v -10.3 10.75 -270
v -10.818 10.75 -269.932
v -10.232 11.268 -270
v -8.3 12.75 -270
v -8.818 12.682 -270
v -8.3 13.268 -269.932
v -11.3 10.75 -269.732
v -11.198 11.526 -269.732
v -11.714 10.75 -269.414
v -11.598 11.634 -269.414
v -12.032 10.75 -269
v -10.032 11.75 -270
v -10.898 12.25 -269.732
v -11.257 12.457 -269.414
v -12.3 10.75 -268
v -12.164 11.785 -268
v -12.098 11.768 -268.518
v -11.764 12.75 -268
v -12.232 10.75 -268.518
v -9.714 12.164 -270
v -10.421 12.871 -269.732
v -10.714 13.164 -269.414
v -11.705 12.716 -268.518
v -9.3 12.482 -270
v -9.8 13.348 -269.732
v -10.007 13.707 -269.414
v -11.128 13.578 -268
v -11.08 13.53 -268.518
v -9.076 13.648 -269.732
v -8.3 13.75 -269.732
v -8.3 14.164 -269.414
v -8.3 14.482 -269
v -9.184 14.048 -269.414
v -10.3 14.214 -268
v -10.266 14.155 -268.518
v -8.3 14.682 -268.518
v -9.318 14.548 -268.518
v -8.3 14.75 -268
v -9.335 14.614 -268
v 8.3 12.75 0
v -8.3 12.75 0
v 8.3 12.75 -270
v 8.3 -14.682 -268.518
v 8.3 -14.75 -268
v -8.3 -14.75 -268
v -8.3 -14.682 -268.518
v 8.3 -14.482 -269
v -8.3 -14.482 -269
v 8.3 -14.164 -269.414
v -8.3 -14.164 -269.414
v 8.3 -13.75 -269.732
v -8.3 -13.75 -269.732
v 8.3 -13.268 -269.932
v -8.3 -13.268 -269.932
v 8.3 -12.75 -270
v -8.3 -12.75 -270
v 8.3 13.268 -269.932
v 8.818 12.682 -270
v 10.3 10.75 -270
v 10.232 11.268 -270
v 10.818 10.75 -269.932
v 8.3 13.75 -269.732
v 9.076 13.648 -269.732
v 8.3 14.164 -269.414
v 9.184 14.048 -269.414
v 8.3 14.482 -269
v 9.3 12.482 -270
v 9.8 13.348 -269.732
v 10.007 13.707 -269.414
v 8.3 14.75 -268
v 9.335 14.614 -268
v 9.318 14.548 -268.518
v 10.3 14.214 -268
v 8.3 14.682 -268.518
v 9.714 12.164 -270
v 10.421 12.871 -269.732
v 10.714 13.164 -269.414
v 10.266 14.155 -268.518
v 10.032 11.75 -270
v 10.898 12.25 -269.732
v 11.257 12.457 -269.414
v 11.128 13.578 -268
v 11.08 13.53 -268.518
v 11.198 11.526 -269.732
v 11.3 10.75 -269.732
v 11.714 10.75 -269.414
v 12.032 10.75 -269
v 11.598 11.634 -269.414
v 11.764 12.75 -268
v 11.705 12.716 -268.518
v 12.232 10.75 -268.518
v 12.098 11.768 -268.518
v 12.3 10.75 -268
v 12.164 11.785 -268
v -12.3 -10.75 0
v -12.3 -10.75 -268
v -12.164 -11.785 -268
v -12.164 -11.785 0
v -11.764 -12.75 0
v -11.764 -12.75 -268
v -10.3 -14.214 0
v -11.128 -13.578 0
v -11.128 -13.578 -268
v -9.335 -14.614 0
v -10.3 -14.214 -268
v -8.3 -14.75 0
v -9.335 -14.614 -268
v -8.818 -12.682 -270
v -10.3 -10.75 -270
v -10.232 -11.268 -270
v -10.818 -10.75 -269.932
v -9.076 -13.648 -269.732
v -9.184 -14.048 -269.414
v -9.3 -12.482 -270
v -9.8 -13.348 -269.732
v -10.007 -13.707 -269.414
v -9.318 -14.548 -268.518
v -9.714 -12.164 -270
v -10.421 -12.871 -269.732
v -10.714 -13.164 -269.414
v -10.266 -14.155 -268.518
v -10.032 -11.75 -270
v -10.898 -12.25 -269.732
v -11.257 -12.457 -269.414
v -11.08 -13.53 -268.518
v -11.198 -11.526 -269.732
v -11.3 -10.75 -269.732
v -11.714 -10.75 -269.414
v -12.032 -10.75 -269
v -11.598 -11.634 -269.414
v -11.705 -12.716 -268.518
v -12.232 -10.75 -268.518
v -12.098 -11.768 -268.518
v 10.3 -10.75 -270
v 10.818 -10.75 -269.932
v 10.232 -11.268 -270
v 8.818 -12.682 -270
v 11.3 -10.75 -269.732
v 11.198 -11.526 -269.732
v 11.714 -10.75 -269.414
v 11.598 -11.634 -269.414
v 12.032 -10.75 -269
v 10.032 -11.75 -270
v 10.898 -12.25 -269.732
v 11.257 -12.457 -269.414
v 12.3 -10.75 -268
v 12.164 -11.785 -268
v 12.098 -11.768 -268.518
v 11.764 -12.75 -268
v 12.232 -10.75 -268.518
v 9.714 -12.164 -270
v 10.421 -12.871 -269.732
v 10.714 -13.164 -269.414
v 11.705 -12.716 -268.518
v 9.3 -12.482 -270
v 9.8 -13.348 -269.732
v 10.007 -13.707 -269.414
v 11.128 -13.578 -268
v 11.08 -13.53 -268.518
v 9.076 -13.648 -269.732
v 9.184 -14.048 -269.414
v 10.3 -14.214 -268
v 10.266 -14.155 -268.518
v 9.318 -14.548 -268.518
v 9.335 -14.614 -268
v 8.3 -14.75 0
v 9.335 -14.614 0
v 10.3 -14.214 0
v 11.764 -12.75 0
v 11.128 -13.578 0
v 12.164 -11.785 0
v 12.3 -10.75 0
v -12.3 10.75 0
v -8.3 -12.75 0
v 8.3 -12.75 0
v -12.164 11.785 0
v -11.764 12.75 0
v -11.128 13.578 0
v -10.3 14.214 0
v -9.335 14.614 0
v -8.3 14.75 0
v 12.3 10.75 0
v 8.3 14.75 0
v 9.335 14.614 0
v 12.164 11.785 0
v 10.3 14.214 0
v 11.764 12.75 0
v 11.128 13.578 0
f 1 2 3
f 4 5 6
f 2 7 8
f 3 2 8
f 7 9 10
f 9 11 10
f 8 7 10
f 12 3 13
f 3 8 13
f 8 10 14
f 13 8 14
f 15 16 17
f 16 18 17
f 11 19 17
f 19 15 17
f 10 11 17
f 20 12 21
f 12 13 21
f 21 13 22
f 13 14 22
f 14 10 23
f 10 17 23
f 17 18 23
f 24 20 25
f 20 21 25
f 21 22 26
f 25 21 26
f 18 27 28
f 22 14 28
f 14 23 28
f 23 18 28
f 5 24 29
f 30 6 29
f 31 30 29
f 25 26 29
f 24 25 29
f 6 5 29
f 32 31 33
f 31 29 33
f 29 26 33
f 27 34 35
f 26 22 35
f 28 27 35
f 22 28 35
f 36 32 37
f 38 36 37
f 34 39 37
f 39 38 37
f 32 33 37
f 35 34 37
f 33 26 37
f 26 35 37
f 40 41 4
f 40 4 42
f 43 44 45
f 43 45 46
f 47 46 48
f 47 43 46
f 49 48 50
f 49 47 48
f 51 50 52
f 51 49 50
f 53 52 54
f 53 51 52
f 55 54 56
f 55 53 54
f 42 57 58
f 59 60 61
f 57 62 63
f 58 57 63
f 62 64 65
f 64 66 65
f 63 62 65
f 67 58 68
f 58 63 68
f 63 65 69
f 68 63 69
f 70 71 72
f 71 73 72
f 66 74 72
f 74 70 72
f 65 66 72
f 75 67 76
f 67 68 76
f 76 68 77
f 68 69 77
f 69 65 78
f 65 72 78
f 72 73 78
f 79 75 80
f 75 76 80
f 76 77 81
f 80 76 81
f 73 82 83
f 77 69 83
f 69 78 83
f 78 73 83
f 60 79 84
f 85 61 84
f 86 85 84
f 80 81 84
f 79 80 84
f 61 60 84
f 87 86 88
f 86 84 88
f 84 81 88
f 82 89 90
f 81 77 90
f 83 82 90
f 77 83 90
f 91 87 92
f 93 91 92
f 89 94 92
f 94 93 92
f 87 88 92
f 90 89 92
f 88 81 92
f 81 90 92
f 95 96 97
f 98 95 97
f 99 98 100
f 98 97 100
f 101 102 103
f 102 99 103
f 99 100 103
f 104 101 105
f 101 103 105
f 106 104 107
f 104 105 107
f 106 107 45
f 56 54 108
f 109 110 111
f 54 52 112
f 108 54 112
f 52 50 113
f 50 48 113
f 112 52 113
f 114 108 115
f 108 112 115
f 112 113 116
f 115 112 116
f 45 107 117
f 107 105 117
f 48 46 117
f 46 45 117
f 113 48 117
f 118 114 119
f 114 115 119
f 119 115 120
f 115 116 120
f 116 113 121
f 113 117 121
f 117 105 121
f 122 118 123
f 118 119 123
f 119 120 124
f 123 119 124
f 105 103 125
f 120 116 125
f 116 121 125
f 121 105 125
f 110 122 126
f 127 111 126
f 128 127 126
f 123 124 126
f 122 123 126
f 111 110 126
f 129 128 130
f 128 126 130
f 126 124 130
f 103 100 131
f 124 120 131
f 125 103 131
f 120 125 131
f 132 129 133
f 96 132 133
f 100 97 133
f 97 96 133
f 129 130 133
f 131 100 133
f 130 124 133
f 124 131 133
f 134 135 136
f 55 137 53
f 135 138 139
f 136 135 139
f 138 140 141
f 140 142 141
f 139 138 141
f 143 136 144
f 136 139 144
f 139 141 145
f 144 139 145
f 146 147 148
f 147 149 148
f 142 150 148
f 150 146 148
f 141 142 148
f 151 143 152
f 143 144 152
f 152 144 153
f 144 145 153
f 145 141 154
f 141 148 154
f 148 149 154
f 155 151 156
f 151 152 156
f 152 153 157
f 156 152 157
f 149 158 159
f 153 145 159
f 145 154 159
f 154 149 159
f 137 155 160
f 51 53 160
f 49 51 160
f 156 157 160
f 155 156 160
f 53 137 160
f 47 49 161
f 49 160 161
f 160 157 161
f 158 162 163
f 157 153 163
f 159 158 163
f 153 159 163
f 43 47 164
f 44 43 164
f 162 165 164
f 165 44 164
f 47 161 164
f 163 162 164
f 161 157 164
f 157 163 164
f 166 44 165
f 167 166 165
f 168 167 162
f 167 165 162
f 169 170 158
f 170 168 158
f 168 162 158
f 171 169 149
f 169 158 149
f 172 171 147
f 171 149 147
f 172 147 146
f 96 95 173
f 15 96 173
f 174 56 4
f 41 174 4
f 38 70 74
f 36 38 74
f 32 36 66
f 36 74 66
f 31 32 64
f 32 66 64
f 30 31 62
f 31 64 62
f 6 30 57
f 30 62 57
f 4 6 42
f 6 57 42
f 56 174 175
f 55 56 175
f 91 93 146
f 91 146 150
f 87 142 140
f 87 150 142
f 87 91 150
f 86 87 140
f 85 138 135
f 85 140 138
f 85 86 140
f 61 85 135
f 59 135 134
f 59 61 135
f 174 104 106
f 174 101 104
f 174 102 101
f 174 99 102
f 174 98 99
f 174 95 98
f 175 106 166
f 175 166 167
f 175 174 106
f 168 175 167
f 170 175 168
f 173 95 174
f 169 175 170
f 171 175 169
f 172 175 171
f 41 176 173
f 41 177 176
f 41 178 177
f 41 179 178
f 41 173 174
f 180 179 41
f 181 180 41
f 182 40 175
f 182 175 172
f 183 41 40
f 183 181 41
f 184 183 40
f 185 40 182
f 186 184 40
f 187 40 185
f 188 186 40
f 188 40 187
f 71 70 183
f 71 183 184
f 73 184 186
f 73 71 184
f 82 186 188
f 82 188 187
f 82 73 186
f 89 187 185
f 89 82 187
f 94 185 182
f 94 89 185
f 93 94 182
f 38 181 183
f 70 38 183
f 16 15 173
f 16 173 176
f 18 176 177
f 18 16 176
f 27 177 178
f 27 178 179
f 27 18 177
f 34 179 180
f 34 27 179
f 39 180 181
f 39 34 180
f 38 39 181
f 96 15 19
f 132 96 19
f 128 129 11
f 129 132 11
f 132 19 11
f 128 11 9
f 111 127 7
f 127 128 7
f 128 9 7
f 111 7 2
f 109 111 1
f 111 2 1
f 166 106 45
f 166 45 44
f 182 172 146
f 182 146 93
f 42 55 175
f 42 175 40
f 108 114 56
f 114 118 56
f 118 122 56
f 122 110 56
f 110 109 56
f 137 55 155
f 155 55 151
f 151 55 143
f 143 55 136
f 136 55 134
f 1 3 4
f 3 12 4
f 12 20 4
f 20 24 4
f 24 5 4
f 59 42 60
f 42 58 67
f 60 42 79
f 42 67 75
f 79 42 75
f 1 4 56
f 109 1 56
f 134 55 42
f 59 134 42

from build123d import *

# Parameters (mm, degrees)
F0_W         = 24.6
F0_H         = 29.5
F0_W_2       = 16.6
F0_H_2       = 25.5
F1_DEPTH     = 270
F2_R         = 1.99999
F3_T1_DEPTH  = 280
F3_T4_ANGLE  = 90
F3_T6_ANGLE  = 90
F3_T8_ANGLE  = 90
F3_T10_ANGLE = 90


# Not quite as in the source:
# - a fillet or chamfer that OpenCascade refuses, or shapes differently, is made with other operations: its cross-section is extruded or revolved along the edge and cut away or added
# - a fillet or chamfer is up to 0.001 mm smaller than in the source, because OpenCascade refuses the exact size


with BuildPart() as f1:
    # F0 (on Top) → F1 (new body)
    with BuildSketch(Plane.XY):
        Rectangle(F0_W, F0_H)
        Rectangle(F0_W_2, F0_H_2, mode=Mode.SUBTRACT)
    extrude(amount=-F1_DEPTH)

    # F2 (radius 2 in the source; OpenCascade refuses exactly that, so slightly less here)
    f2_edges = [f1.edges().sort_by_distance(p)[0] for p in [
        (-12.3, 0, -270),
        (0, 14.75, -270),
        (12.3, 0, -270),
        (0, -14.75, -270),
    ]]
    fillet(f2_edges, radius=F2_R)

    # F3: fillet of radius 4 on 4 edges, made by hand

    # F3_s2 → F3_t1 (cut)
    with BuildSketch(Plane.XY.offset(-270)):
        with BuildLine():
            ThreePointArc((8.3, 14.75), (11.1284271247, 13.5784271247), (12.3, 10.75))
            Line((12.3, 10.75), (12.3, 14.75))
            Line((12.3, 14.75), (8.3, 14.75))
        make_face()
        with BuildLine():
            ThreePointArc((-12.3, 10.75), (-11.1284271247, 13.5784271247), (-8.3, 14.75))
            Line((-8.3, 14.75), (-12.3, 14.75))
            Line((-12.3, 14.75), (-12.3, 10.75))
        make_face()
        with BuildLine():
            ThreePointArc((8.3, -14.75), (11.1284271247, -13.5784271247), (12.3, -10.75))
            Line((12.3, -10.75), (12.3, -14.75))
            Line((12.3, -14.75), (8.3, -14.75))
        make_face()
        with BuildLine():
            ThreePointArc((-12.3, -10.75), (-11.1284271247, -13.5784271247), (-8.3, -14.75))
            Line((-8.3, -14.75), (-12.3, -14.75))
            Line((-12.3, -14.75), (-12.3, -10.75))
        make_face()
    extrude(amount=F3_T1_DEPTH, mode=Mode.SUBTRACT)

    # F3_s3 → F3_t4 (revolve, cut)
    with BuildSketch(Plane.YZ.offset(-8.3)):
        with BuildLine():
            ThreePointArc((-12.75001, -270), (-14.1642164913, -269.4142164913), (-14.75, -268.00001))
            Line((-14.75, -268.00001), (-14.75, -270))
            Line((-14.75, -270), (-12.75001, -270))
        make_face()
    revolve(axis=Axis((-8.3, -10.75, -270), (0, 0, -1)), revolution_arc=F3_T4_ANGLE, mode=Mode.SUBTRACT)

    # F3_s5 → F3_t6 (revolve, cut)
    with BuildSketch(Plane.XZ.offset(10.75)):
        with BuildLine():
            ThreePointArc((10.30001, -270), (11.7142164913, -269.4142164913), (12.3, -268.00001))
            Line((12.3, -268.00001), (12.3, -270))
            Line((12.3, -270), (10.30001, -270))
        make_face()
    revolve(axis=Axis((8.3, -10.75, -270), (0, 0, -1)), revolution_arc=F3_T6_ANGLE, mode=Mode.SUBTRACT)

    # F3_s7 → F3_t8 (revolve, cut)
    with BuildSketch(Plane.XZ.offset(-10.75)):
        with BuildLine():
            ThreePointArc((-10.30001, -270), (-11.7142164913, -269.4142164913), (-12.3, -268.00001))
            Line((-12.3, -268.00001), (-12.3, -270))
            Line((-12.3, -270), (-10.30001, -270))
        make_face()
    revolve(axis=Axis((-8.3, 10.75, -270), (0, 0, -1)), revolution_arc=F3_T8_ANGLE, mode=Mode.SUBTRACT)

    # F3_s9 → F3_t10 (revolve, cut)
    with BuildSketch(Plane.YZ.offset(8.3)):
        with BuildLine():
            ThreePointArc((12.75001, -270), (14.1642164913, -269.4142164913), (14.75, -268.00001))
            Line((14.75, -268.00001), (14.75, -270))
            Line((14.75, -270), (12.75001, -270))
        make_face()
    revolve(axis=Axis((8.3, 10.75, -270), (0, 0, -1)), revolution_arc=F3_T10_ANGLE, mode=Mode.SUBTRACT)


solid = f1.part
